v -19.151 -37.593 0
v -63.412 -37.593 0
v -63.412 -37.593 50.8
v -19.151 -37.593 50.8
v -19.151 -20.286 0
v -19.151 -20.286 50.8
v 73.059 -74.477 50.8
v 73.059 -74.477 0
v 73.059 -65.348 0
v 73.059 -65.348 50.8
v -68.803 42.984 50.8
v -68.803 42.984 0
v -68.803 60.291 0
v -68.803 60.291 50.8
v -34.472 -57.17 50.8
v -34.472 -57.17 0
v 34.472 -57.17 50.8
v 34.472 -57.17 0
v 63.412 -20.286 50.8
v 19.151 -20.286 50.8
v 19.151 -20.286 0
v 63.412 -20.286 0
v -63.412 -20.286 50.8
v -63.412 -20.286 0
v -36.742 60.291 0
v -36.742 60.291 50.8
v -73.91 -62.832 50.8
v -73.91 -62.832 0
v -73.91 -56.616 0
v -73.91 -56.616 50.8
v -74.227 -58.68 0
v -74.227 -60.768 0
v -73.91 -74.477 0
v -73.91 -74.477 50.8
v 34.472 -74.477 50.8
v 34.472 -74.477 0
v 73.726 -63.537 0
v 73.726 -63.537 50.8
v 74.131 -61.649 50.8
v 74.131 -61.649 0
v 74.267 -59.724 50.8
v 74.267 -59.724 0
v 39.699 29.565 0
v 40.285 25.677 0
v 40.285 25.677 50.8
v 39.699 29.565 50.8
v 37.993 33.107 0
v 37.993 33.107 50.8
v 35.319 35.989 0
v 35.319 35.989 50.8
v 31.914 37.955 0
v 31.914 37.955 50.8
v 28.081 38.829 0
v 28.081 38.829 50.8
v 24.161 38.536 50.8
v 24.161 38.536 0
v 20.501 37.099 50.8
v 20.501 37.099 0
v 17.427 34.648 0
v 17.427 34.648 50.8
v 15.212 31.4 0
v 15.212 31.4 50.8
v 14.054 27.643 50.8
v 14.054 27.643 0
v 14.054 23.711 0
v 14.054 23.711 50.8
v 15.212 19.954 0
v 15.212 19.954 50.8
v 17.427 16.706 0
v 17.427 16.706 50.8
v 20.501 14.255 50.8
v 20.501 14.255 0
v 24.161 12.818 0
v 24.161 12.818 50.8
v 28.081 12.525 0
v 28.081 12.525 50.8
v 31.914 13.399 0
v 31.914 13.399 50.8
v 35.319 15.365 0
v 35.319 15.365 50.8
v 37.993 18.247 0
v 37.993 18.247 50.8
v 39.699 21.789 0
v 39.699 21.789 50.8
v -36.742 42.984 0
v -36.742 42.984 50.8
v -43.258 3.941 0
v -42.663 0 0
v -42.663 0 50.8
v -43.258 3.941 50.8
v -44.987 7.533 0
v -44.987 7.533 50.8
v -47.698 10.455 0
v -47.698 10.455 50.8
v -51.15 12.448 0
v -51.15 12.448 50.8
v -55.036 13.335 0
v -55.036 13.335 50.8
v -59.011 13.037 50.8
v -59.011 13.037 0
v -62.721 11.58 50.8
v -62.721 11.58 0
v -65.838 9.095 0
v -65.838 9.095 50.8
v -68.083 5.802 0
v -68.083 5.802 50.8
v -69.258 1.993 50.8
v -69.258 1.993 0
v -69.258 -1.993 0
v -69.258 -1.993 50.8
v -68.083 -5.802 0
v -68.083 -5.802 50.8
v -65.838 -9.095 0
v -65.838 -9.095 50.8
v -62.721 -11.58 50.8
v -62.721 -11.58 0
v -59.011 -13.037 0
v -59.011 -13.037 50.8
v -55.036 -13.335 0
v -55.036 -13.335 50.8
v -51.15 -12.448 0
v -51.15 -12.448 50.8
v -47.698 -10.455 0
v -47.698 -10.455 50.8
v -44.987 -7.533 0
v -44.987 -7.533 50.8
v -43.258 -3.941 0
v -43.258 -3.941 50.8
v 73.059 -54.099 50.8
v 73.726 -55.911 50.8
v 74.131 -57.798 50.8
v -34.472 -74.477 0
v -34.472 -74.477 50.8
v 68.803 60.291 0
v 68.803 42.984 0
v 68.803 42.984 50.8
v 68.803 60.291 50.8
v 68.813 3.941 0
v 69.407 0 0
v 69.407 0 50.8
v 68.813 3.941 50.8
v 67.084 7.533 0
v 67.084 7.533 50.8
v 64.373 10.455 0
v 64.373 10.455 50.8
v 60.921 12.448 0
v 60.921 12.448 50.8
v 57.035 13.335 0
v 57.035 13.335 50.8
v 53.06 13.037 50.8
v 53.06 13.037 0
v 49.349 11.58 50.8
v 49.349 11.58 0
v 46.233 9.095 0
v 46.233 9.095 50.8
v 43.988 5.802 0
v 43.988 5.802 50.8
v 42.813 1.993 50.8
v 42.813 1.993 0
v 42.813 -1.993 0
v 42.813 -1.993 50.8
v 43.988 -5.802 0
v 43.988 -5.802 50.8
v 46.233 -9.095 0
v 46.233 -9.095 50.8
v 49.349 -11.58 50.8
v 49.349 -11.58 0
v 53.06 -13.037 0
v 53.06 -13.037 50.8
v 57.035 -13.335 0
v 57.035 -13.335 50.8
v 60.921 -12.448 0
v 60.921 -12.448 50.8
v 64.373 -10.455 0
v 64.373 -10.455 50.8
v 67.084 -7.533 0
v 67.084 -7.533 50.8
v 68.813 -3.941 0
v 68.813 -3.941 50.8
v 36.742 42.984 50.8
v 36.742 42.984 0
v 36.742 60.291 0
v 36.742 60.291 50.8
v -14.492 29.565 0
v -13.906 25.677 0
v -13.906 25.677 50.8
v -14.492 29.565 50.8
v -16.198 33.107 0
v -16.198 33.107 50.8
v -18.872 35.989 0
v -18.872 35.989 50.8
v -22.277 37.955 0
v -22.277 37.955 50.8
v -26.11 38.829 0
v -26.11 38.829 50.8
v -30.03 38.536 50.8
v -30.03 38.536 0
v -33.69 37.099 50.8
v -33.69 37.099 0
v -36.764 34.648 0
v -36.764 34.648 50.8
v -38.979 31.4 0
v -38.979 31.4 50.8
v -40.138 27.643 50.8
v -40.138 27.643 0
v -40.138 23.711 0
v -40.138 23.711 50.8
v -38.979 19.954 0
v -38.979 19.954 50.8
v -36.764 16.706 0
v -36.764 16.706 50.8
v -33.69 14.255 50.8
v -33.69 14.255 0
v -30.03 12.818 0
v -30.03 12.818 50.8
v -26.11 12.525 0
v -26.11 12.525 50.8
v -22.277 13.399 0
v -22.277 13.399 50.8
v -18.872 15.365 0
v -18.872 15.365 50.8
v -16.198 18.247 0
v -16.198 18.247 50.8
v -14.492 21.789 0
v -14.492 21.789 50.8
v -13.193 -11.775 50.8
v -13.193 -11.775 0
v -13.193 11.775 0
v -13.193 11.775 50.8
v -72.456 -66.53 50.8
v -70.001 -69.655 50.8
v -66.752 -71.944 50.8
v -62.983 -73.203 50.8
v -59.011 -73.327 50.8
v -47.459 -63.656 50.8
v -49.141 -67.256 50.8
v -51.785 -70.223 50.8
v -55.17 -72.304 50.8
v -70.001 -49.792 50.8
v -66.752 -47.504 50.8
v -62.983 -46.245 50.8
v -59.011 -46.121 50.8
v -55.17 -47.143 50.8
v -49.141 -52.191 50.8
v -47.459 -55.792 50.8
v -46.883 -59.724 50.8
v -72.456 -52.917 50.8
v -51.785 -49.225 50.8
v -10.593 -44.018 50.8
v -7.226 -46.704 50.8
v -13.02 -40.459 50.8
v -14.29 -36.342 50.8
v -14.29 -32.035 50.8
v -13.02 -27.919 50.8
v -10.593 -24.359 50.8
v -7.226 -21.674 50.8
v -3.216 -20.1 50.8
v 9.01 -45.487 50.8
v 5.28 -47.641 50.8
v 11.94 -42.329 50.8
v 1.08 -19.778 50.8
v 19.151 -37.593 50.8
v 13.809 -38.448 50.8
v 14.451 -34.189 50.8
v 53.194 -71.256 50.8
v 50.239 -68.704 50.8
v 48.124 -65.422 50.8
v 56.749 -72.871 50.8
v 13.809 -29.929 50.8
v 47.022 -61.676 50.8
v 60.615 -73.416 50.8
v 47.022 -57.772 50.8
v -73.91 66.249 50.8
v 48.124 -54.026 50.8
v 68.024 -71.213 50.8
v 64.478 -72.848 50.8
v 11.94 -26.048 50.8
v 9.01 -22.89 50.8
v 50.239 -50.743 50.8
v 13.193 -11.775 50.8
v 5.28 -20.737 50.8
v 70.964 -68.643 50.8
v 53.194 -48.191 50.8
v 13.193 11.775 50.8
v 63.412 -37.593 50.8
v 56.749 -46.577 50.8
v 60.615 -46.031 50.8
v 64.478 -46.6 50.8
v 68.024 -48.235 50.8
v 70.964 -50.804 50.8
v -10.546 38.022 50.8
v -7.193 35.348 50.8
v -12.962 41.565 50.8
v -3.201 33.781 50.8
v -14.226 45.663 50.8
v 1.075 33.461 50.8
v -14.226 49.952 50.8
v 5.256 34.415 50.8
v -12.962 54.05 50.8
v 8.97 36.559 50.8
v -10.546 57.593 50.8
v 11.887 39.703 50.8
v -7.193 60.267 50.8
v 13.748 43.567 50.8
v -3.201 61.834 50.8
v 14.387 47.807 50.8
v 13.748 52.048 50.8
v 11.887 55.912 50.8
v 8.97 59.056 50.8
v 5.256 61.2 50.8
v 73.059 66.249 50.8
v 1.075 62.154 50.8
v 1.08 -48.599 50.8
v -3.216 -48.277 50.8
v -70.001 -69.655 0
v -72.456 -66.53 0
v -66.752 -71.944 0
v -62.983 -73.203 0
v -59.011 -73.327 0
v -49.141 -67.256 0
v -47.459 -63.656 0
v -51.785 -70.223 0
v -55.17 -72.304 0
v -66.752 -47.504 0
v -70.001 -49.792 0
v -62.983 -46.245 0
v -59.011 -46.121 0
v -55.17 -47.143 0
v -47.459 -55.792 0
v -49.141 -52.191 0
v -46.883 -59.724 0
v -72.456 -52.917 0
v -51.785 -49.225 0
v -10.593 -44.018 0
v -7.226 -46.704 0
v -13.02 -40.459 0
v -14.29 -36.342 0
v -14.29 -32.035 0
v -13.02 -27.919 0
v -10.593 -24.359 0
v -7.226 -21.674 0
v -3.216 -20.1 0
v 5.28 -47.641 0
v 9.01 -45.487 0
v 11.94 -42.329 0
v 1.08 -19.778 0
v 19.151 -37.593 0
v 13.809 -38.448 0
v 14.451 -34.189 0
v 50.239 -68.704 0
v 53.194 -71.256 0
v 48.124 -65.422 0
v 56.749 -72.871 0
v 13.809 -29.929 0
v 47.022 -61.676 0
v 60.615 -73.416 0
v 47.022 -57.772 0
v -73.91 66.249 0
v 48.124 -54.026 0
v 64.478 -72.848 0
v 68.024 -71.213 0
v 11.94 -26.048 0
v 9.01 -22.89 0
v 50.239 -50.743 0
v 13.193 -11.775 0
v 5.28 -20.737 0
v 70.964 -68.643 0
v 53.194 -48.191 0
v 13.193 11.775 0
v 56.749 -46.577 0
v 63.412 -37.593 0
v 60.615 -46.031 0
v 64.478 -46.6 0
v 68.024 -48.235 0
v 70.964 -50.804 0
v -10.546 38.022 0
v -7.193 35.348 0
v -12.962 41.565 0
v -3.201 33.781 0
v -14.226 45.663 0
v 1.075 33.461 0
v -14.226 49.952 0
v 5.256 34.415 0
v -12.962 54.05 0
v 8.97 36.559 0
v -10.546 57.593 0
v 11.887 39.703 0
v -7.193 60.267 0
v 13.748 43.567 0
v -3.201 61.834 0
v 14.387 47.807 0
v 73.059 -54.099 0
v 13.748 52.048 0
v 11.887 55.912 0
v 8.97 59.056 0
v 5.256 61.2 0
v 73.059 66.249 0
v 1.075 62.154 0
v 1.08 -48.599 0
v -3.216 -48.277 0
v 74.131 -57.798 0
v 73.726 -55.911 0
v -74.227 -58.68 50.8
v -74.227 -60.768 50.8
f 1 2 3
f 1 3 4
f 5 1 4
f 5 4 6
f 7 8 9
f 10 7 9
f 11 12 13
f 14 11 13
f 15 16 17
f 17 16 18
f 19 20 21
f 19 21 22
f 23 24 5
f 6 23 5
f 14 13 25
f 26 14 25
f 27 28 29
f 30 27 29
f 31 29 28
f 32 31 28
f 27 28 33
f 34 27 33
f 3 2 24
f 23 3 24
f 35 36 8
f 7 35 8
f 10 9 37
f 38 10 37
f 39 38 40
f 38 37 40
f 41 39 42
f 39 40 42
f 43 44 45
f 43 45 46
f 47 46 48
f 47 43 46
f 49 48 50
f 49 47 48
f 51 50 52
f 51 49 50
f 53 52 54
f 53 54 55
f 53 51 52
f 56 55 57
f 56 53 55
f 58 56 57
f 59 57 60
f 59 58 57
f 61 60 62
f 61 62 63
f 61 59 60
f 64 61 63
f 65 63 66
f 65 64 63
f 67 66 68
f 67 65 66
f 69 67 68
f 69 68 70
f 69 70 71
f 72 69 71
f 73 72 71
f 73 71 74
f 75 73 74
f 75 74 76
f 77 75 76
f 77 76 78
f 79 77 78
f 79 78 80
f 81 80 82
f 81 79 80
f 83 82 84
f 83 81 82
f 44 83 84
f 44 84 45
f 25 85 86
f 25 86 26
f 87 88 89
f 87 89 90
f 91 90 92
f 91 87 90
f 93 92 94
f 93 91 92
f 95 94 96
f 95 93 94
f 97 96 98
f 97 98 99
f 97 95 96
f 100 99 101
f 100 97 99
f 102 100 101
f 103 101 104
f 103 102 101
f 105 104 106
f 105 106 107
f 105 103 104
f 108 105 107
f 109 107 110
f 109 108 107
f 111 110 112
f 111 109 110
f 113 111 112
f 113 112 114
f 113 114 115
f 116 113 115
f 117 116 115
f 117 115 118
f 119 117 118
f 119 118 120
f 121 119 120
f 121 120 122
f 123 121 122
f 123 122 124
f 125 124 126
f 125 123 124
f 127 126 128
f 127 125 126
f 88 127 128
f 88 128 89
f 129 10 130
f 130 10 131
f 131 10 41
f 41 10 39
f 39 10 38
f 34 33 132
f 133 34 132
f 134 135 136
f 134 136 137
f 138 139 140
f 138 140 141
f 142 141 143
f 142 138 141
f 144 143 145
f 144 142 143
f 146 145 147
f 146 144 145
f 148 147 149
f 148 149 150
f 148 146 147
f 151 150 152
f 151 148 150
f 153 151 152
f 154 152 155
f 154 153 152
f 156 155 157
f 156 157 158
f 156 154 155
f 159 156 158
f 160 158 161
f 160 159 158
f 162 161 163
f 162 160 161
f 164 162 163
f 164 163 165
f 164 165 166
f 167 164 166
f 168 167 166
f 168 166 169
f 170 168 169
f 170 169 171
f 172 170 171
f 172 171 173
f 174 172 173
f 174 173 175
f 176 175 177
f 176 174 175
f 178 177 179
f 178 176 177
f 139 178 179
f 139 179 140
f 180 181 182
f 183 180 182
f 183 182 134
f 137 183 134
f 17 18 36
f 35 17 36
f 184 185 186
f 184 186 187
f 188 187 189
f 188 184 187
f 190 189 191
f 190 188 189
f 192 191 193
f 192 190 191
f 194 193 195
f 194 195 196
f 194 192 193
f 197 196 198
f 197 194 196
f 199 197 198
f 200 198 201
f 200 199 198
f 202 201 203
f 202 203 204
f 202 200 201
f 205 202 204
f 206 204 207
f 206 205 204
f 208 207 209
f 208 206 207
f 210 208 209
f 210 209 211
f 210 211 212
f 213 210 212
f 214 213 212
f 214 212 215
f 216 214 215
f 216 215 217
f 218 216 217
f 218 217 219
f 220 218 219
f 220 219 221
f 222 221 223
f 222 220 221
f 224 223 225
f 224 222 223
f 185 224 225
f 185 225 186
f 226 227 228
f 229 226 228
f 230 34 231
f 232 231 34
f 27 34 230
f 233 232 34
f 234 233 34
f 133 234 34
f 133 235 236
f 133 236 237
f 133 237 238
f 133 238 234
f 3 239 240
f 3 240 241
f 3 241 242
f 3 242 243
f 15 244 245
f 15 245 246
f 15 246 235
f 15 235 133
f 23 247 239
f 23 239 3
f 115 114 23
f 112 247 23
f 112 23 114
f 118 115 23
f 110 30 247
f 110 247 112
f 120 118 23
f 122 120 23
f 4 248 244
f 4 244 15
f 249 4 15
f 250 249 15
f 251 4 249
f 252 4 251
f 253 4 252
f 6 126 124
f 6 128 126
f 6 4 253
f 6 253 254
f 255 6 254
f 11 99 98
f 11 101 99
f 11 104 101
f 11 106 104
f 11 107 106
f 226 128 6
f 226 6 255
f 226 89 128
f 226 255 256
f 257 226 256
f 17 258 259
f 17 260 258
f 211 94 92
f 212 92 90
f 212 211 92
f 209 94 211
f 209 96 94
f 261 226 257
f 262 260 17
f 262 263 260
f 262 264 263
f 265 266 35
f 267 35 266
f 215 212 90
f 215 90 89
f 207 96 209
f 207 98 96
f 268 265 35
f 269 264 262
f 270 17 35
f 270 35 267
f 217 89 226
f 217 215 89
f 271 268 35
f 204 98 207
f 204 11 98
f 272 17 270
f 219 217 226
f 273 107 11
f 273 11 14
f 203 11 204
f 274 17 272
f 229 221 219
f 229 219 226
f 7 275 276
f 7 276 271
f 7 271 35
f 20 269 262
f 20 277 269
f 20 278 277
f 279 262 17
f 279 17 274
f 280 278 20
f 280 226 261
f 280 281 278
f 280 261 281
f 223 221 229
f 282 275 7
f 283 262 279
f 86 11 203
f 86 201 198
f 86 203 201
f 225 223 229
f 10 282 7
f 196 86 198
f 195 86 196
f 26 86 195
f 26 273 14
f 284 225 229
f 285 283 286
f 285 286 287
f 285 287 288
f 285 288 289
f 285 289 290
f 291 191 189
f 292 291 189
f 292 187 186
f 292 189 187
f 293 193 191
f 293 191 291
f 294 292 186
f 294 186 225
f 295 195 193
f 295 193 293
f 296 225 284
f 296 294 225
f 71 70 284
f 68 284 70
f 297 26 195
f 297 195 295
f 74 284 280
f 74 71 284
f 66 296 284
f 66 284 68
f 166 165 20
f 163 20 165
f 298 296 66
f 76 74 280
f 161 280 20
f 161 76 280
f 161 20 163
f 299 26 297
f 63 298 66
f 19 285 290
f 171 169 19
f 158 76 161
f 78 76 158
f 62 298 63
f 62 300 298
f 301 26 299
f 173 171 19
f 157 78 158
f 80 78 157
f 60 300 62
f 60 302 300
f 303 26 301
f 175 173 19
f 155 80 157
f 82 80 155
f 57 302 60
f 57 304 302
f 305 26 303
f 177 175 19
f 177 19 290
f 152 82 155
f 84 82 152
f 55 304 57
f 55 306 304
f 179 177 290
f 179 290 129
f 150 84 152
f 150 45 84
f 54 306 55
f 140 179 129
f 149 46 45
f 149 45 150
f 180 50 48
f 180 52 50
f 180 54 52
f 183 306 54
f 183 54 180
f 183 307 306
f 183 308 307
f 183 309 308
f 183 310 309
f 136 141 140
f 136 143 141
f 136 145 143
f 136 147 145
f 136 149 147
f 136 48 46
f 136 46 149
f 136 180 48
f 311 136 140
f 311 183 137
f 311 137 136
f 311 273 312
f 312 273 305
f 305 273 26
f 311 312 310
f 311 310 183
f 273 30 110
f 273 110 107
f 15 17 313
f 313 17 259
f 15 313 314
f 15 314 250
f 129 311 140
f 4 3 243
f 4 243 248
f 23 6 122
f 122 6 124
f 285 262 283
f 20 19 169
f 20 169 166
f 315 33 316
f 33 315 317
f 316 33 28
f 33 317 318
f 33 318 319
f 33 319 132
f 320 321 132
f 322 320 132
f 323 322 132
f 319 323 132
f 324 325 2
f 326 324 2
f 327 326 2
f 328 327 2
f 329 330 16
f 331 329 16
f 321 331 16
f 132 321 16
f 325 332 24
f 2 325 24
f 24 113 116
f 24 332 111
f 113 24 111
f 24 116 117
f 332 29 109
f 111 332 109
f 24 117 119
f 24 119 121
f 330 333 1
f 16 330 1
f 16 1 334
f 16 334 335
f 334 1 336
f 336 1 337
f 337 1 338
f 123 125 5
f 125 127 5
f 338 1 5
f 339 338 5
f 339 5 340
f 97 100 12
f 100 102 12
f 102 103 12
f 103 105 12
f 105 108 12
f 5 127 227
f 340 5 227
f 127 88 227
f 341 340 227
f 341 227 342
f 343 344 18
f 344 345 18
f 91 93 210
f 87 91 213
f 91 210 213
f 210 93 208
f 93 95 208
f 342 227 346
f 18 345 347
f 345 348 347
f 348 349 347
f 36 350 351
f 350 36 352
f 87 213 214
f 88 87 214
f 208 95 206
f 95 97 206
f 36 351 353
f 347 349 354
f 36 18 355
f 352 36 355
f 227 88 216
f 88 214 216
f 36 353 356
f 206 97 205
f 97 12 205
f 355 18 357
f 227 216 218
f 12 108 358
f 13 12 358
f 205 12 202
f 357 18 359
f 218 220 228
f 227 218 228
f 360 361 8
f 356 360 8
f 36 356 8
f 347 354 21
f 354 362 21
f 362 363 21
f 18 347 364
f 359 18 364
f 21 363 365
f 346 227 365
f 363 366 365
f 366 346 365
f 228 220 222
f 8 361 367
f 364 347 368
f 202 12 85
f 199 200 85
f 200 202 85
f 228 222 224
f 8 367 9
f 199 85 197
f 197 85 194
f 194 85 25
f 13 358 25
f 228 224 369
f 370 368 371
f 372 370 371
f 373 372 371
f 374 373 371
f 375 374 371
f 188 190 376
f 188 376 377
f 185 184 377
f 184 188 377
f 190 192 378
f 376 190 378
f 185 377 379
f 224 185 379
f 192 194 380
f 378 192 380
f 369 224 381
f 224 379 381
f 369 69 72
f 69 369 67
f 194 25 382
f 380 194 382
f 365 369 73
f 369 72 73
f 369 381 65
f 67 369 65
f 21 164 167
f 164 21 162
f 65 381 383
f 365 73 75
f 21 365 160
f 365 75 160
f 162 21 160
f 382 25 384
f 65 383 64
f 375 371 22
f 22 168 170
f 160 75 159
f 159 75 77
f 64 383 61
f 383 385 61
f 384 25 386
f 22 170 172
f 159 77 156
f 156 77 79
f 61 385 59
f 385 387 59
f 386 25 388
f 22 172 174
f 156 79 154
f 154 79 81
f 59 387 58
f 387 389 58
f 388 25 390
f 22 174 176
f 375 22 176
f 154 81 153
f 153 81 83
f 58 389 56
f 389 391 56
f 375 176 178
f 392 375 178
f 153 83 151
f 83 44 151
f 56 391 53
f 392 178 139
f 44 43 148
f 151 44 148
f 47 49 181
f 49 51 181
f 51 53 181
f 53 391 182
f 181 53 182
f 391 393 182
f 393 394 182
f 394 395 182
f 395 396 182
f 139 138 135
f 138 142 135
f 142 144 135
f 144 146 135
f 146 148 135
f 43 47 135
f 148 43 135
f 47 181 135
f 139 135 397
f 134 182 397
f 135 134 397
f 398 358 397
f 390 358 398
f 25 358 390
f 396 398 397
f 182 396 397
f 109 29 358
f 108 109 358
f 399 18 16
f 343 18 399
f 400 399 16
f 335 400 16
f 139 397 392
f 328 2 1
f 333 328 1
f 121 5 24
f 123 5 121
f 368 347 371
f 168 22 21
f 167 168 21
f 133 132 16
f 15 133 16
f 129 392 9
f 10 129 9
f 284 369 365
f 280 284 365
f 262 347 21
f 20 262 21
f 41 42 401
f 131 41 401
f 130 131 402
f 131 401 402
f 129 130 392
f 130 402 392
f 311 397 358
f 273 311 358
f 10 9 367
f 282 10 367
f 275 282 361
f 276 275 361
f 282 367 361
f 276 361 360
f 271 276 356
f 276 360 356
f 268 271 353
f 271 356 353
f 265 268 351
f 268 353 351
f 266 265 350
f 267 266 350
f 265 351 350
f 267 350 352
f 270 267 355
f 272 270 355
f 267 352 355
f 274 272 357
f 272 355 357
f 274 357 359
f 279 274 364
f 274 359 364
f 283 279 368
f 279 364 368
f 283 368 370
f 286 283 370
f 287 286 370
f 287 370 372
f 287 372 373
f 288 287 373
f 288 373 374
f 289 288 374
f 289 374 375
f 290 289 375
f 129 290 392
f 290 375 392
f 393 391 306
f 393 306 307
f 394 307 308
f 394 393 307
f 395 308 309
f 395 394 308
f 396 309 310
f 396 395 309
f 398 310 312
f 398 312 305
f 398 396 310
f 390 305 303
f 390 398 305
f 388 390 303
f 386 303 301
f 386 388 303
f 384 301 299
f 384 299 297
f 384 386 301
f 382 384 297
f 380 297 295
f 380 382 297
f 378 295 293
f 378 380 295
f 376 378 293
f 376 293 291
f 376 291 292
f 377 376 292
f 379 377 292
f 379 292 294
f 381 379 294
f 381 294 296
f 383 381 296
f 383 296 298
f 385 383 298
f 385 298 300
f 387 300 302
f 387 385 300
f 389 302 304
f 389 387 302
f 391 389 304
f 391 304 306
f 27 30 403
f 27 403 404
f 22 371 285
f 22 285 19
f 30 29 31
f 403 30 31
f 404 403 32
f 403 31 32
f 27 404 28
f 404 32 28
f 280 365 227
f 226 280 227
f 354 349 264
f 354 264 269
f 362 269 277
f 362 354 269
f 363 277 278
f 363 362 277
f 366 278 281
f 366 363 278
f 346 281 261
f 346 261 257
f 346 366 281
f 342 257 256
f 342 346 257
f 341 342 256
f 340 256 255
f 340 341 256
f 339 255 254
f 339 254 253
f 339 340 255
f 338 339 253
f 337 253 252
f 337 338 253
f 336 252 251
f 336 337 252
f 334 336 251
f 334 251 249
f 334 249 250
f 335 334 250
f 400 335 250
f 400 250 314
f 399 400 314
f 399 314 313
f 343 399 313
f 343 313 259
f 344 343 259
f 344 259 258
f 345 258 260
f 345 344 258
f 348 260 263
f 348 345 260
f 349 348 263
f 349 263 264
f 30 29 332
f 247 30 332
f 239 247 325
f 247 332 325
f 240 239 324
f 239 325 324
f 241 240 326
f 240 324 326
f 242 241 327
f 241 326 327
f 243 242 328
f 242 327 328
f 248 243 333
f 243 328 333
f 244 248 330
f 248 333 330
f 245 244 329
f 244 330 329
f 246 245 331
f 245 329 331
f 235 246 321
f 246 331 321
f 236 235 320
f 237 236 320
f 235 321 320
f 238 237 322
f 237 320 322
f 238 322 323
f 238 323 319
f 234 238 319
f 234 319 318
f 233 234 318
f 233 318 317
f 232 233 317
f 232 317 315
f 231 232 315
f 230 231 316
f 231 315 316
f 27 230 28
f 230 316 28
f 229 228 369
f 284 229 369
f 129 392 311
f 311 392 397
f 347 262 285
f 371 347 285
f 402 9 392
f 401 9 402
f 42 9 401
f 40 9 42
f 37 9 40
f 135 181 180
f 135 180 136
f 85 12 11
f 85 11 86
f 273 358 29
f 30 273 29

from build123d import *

# Parameters (mm, degrees)
F1_DEPTH = 50.8
F0_W     = 44.2608613521
F0_H     = 17.3071306199
F0_R     = 14.4511051607
F0_R_2   = 13.3719234315
F0_R_3   = 13.1893243286
F0_W_2   = 32.0607423782
F0_H_2   = 17.3071287572
F0_R_4   = 14.3869020543


with BuildPart() as f1:
    # F0 (on Top) → F1 (new body)
    with BuildSketch(Plane.XY):
        with BuildLine():
            Line((-73.909945786, -62.8318370183), (-73.909945786, -56.6157146494))
            ThreePointArc((-73.909945786, -56.6157146494), (-74.267362354, -59.7237758338), (-73.909945786, -62.8318370183))
        make_face()
    extrude(amount=F1_DEPTH)


with BuildPart() as f1b:
    # F0 (on Top) → F1, piece 2 (new body)
    with BuildSketch(Plane.XY):
        with BuildLine():
            ThreePointArc((74.267362354, -59.7237758338), (73.9618084643, -56.847288867), (73.058784008, -54.0991827407))
            Line((73.058784008, -54.0991827407), (73.058784008, -65.3483689269))
            ThreePointArc((73.058784008, -65.3483689269), (73.9618084643, -62.6002628007), (74.267362354, -59.7237758338))
        make_face()
    extrude(amount=F1_DEPTH)


with BuildPart() as f1c:
    # F0 (on Top) → F1, piece 3 (new body)
    with BuildSketch(Plane.XY):
        with BuildLine():
            Line((73.058784008, 66.2494152784), (-73.909945786, 66.2494152784))
            Line((-73.909945786, 66.2494152784), (-73.909945786, -56.6157146494))
            ThreePointArc((-73.909945786, -56.6157146494), (-59.0106765184, -46.1210098821), (-46.8825352214, -59.7237758338))
            ThreePointArc((-46.8825352214, -59.7237758338), (-59.0106765184, -73.3265417856), (-73.909945786, -62.8318370183))
            Line((-73.909945786, -62.8318370183), (-73.909945786, -74.4773894548))
            Line((-73.909945786, -74.4773894548), (-34.4723947346, -74.4773894548))
            Line((-34.4723947346, -74.4773894548), (-34.4723947346, -57.1702644229))
            Line((-34.4723947346, -57.1702644229), (0, -57.1702644229))
            Line((0, -57.1702644229), (34.4723947346, -57.1702644229))
            Line((34.4723947346, -57.1702644229), (34.4723947346, -74.4773894548))
            Line((34.4723947346, -74.4773894548), (73.058784008, -74.4773894548))
            Line((73.058784008, -74.4773894548), (73.058784008, -65.3483689269))
            ThreePointArc((73.058784008, -65.3483689269), (46.8825352214, -59.7237758338), (73.058784008, -54.0991827407))
            Line((73.058784008, -54.0991827407), (73.058784008, 66.2494152784))
        make_face()
        with Locations((-41.2817588076, -28.9397882298)):
            Rectangle(F0_W, F0_H, mode=Mode.SUBTRACT)
        with Locations((0, -34.1886691749)):
            Circle(F0_R, mode=Mode.SUBTRACT)
        with Locations((41.2817588076, -28.9397882298)):
            Rectangle(F0_W, F0_H, mode=Mode.SUBTRACT)
        with Locations((-56.0353733599, 0)):
            Circle(F0_R_2, mode=Mode.SUBTRACT)
        with Locations((-27.0955841988, 25.6769694388)):
            Circle(F0_R_3, mode=Mode.SUBTRACT)
        with Locations((-52.772551775, 51.6376625746)):
            Rectangle(F0_W_2, F0_H_2, mode=Mode.SUBTRACT)
        Polygon((-13.1931379437, 11.7745213211), (0, 11.7745213211), (13.1931379437, 11.7745213211), (13.1931379437, 0), (13.1931379437, -11.7745213211), (0, -11.7745213211), (-13.1931379437, -11.7745213211), (-13.1931379437, 0), align=None, mode=Mode.SUBTRACT)
        with Locations((27.0955841988, 25.6769694388)):
            Circle(F0_R_3, mode=Mode.SUBTRACT)
        with Locations((56.0353733599, 0)):
            Circle(F0_R_2, mode=Mode.SUBTRACT)
        with Locations((0, 47.8073954582)):
            Circle(F0_R_4, mode=Mode.SUBTRACT)
        with Locations((52.772551775, 51.6376625746)):
            Rectangle(F0_W_2, F0_H_2, mode=Mode.SUBTRACT)
    extrude(amount=F1_DEPTH)


solid = Compound([f1.part, f1b.part, f1c.part])
